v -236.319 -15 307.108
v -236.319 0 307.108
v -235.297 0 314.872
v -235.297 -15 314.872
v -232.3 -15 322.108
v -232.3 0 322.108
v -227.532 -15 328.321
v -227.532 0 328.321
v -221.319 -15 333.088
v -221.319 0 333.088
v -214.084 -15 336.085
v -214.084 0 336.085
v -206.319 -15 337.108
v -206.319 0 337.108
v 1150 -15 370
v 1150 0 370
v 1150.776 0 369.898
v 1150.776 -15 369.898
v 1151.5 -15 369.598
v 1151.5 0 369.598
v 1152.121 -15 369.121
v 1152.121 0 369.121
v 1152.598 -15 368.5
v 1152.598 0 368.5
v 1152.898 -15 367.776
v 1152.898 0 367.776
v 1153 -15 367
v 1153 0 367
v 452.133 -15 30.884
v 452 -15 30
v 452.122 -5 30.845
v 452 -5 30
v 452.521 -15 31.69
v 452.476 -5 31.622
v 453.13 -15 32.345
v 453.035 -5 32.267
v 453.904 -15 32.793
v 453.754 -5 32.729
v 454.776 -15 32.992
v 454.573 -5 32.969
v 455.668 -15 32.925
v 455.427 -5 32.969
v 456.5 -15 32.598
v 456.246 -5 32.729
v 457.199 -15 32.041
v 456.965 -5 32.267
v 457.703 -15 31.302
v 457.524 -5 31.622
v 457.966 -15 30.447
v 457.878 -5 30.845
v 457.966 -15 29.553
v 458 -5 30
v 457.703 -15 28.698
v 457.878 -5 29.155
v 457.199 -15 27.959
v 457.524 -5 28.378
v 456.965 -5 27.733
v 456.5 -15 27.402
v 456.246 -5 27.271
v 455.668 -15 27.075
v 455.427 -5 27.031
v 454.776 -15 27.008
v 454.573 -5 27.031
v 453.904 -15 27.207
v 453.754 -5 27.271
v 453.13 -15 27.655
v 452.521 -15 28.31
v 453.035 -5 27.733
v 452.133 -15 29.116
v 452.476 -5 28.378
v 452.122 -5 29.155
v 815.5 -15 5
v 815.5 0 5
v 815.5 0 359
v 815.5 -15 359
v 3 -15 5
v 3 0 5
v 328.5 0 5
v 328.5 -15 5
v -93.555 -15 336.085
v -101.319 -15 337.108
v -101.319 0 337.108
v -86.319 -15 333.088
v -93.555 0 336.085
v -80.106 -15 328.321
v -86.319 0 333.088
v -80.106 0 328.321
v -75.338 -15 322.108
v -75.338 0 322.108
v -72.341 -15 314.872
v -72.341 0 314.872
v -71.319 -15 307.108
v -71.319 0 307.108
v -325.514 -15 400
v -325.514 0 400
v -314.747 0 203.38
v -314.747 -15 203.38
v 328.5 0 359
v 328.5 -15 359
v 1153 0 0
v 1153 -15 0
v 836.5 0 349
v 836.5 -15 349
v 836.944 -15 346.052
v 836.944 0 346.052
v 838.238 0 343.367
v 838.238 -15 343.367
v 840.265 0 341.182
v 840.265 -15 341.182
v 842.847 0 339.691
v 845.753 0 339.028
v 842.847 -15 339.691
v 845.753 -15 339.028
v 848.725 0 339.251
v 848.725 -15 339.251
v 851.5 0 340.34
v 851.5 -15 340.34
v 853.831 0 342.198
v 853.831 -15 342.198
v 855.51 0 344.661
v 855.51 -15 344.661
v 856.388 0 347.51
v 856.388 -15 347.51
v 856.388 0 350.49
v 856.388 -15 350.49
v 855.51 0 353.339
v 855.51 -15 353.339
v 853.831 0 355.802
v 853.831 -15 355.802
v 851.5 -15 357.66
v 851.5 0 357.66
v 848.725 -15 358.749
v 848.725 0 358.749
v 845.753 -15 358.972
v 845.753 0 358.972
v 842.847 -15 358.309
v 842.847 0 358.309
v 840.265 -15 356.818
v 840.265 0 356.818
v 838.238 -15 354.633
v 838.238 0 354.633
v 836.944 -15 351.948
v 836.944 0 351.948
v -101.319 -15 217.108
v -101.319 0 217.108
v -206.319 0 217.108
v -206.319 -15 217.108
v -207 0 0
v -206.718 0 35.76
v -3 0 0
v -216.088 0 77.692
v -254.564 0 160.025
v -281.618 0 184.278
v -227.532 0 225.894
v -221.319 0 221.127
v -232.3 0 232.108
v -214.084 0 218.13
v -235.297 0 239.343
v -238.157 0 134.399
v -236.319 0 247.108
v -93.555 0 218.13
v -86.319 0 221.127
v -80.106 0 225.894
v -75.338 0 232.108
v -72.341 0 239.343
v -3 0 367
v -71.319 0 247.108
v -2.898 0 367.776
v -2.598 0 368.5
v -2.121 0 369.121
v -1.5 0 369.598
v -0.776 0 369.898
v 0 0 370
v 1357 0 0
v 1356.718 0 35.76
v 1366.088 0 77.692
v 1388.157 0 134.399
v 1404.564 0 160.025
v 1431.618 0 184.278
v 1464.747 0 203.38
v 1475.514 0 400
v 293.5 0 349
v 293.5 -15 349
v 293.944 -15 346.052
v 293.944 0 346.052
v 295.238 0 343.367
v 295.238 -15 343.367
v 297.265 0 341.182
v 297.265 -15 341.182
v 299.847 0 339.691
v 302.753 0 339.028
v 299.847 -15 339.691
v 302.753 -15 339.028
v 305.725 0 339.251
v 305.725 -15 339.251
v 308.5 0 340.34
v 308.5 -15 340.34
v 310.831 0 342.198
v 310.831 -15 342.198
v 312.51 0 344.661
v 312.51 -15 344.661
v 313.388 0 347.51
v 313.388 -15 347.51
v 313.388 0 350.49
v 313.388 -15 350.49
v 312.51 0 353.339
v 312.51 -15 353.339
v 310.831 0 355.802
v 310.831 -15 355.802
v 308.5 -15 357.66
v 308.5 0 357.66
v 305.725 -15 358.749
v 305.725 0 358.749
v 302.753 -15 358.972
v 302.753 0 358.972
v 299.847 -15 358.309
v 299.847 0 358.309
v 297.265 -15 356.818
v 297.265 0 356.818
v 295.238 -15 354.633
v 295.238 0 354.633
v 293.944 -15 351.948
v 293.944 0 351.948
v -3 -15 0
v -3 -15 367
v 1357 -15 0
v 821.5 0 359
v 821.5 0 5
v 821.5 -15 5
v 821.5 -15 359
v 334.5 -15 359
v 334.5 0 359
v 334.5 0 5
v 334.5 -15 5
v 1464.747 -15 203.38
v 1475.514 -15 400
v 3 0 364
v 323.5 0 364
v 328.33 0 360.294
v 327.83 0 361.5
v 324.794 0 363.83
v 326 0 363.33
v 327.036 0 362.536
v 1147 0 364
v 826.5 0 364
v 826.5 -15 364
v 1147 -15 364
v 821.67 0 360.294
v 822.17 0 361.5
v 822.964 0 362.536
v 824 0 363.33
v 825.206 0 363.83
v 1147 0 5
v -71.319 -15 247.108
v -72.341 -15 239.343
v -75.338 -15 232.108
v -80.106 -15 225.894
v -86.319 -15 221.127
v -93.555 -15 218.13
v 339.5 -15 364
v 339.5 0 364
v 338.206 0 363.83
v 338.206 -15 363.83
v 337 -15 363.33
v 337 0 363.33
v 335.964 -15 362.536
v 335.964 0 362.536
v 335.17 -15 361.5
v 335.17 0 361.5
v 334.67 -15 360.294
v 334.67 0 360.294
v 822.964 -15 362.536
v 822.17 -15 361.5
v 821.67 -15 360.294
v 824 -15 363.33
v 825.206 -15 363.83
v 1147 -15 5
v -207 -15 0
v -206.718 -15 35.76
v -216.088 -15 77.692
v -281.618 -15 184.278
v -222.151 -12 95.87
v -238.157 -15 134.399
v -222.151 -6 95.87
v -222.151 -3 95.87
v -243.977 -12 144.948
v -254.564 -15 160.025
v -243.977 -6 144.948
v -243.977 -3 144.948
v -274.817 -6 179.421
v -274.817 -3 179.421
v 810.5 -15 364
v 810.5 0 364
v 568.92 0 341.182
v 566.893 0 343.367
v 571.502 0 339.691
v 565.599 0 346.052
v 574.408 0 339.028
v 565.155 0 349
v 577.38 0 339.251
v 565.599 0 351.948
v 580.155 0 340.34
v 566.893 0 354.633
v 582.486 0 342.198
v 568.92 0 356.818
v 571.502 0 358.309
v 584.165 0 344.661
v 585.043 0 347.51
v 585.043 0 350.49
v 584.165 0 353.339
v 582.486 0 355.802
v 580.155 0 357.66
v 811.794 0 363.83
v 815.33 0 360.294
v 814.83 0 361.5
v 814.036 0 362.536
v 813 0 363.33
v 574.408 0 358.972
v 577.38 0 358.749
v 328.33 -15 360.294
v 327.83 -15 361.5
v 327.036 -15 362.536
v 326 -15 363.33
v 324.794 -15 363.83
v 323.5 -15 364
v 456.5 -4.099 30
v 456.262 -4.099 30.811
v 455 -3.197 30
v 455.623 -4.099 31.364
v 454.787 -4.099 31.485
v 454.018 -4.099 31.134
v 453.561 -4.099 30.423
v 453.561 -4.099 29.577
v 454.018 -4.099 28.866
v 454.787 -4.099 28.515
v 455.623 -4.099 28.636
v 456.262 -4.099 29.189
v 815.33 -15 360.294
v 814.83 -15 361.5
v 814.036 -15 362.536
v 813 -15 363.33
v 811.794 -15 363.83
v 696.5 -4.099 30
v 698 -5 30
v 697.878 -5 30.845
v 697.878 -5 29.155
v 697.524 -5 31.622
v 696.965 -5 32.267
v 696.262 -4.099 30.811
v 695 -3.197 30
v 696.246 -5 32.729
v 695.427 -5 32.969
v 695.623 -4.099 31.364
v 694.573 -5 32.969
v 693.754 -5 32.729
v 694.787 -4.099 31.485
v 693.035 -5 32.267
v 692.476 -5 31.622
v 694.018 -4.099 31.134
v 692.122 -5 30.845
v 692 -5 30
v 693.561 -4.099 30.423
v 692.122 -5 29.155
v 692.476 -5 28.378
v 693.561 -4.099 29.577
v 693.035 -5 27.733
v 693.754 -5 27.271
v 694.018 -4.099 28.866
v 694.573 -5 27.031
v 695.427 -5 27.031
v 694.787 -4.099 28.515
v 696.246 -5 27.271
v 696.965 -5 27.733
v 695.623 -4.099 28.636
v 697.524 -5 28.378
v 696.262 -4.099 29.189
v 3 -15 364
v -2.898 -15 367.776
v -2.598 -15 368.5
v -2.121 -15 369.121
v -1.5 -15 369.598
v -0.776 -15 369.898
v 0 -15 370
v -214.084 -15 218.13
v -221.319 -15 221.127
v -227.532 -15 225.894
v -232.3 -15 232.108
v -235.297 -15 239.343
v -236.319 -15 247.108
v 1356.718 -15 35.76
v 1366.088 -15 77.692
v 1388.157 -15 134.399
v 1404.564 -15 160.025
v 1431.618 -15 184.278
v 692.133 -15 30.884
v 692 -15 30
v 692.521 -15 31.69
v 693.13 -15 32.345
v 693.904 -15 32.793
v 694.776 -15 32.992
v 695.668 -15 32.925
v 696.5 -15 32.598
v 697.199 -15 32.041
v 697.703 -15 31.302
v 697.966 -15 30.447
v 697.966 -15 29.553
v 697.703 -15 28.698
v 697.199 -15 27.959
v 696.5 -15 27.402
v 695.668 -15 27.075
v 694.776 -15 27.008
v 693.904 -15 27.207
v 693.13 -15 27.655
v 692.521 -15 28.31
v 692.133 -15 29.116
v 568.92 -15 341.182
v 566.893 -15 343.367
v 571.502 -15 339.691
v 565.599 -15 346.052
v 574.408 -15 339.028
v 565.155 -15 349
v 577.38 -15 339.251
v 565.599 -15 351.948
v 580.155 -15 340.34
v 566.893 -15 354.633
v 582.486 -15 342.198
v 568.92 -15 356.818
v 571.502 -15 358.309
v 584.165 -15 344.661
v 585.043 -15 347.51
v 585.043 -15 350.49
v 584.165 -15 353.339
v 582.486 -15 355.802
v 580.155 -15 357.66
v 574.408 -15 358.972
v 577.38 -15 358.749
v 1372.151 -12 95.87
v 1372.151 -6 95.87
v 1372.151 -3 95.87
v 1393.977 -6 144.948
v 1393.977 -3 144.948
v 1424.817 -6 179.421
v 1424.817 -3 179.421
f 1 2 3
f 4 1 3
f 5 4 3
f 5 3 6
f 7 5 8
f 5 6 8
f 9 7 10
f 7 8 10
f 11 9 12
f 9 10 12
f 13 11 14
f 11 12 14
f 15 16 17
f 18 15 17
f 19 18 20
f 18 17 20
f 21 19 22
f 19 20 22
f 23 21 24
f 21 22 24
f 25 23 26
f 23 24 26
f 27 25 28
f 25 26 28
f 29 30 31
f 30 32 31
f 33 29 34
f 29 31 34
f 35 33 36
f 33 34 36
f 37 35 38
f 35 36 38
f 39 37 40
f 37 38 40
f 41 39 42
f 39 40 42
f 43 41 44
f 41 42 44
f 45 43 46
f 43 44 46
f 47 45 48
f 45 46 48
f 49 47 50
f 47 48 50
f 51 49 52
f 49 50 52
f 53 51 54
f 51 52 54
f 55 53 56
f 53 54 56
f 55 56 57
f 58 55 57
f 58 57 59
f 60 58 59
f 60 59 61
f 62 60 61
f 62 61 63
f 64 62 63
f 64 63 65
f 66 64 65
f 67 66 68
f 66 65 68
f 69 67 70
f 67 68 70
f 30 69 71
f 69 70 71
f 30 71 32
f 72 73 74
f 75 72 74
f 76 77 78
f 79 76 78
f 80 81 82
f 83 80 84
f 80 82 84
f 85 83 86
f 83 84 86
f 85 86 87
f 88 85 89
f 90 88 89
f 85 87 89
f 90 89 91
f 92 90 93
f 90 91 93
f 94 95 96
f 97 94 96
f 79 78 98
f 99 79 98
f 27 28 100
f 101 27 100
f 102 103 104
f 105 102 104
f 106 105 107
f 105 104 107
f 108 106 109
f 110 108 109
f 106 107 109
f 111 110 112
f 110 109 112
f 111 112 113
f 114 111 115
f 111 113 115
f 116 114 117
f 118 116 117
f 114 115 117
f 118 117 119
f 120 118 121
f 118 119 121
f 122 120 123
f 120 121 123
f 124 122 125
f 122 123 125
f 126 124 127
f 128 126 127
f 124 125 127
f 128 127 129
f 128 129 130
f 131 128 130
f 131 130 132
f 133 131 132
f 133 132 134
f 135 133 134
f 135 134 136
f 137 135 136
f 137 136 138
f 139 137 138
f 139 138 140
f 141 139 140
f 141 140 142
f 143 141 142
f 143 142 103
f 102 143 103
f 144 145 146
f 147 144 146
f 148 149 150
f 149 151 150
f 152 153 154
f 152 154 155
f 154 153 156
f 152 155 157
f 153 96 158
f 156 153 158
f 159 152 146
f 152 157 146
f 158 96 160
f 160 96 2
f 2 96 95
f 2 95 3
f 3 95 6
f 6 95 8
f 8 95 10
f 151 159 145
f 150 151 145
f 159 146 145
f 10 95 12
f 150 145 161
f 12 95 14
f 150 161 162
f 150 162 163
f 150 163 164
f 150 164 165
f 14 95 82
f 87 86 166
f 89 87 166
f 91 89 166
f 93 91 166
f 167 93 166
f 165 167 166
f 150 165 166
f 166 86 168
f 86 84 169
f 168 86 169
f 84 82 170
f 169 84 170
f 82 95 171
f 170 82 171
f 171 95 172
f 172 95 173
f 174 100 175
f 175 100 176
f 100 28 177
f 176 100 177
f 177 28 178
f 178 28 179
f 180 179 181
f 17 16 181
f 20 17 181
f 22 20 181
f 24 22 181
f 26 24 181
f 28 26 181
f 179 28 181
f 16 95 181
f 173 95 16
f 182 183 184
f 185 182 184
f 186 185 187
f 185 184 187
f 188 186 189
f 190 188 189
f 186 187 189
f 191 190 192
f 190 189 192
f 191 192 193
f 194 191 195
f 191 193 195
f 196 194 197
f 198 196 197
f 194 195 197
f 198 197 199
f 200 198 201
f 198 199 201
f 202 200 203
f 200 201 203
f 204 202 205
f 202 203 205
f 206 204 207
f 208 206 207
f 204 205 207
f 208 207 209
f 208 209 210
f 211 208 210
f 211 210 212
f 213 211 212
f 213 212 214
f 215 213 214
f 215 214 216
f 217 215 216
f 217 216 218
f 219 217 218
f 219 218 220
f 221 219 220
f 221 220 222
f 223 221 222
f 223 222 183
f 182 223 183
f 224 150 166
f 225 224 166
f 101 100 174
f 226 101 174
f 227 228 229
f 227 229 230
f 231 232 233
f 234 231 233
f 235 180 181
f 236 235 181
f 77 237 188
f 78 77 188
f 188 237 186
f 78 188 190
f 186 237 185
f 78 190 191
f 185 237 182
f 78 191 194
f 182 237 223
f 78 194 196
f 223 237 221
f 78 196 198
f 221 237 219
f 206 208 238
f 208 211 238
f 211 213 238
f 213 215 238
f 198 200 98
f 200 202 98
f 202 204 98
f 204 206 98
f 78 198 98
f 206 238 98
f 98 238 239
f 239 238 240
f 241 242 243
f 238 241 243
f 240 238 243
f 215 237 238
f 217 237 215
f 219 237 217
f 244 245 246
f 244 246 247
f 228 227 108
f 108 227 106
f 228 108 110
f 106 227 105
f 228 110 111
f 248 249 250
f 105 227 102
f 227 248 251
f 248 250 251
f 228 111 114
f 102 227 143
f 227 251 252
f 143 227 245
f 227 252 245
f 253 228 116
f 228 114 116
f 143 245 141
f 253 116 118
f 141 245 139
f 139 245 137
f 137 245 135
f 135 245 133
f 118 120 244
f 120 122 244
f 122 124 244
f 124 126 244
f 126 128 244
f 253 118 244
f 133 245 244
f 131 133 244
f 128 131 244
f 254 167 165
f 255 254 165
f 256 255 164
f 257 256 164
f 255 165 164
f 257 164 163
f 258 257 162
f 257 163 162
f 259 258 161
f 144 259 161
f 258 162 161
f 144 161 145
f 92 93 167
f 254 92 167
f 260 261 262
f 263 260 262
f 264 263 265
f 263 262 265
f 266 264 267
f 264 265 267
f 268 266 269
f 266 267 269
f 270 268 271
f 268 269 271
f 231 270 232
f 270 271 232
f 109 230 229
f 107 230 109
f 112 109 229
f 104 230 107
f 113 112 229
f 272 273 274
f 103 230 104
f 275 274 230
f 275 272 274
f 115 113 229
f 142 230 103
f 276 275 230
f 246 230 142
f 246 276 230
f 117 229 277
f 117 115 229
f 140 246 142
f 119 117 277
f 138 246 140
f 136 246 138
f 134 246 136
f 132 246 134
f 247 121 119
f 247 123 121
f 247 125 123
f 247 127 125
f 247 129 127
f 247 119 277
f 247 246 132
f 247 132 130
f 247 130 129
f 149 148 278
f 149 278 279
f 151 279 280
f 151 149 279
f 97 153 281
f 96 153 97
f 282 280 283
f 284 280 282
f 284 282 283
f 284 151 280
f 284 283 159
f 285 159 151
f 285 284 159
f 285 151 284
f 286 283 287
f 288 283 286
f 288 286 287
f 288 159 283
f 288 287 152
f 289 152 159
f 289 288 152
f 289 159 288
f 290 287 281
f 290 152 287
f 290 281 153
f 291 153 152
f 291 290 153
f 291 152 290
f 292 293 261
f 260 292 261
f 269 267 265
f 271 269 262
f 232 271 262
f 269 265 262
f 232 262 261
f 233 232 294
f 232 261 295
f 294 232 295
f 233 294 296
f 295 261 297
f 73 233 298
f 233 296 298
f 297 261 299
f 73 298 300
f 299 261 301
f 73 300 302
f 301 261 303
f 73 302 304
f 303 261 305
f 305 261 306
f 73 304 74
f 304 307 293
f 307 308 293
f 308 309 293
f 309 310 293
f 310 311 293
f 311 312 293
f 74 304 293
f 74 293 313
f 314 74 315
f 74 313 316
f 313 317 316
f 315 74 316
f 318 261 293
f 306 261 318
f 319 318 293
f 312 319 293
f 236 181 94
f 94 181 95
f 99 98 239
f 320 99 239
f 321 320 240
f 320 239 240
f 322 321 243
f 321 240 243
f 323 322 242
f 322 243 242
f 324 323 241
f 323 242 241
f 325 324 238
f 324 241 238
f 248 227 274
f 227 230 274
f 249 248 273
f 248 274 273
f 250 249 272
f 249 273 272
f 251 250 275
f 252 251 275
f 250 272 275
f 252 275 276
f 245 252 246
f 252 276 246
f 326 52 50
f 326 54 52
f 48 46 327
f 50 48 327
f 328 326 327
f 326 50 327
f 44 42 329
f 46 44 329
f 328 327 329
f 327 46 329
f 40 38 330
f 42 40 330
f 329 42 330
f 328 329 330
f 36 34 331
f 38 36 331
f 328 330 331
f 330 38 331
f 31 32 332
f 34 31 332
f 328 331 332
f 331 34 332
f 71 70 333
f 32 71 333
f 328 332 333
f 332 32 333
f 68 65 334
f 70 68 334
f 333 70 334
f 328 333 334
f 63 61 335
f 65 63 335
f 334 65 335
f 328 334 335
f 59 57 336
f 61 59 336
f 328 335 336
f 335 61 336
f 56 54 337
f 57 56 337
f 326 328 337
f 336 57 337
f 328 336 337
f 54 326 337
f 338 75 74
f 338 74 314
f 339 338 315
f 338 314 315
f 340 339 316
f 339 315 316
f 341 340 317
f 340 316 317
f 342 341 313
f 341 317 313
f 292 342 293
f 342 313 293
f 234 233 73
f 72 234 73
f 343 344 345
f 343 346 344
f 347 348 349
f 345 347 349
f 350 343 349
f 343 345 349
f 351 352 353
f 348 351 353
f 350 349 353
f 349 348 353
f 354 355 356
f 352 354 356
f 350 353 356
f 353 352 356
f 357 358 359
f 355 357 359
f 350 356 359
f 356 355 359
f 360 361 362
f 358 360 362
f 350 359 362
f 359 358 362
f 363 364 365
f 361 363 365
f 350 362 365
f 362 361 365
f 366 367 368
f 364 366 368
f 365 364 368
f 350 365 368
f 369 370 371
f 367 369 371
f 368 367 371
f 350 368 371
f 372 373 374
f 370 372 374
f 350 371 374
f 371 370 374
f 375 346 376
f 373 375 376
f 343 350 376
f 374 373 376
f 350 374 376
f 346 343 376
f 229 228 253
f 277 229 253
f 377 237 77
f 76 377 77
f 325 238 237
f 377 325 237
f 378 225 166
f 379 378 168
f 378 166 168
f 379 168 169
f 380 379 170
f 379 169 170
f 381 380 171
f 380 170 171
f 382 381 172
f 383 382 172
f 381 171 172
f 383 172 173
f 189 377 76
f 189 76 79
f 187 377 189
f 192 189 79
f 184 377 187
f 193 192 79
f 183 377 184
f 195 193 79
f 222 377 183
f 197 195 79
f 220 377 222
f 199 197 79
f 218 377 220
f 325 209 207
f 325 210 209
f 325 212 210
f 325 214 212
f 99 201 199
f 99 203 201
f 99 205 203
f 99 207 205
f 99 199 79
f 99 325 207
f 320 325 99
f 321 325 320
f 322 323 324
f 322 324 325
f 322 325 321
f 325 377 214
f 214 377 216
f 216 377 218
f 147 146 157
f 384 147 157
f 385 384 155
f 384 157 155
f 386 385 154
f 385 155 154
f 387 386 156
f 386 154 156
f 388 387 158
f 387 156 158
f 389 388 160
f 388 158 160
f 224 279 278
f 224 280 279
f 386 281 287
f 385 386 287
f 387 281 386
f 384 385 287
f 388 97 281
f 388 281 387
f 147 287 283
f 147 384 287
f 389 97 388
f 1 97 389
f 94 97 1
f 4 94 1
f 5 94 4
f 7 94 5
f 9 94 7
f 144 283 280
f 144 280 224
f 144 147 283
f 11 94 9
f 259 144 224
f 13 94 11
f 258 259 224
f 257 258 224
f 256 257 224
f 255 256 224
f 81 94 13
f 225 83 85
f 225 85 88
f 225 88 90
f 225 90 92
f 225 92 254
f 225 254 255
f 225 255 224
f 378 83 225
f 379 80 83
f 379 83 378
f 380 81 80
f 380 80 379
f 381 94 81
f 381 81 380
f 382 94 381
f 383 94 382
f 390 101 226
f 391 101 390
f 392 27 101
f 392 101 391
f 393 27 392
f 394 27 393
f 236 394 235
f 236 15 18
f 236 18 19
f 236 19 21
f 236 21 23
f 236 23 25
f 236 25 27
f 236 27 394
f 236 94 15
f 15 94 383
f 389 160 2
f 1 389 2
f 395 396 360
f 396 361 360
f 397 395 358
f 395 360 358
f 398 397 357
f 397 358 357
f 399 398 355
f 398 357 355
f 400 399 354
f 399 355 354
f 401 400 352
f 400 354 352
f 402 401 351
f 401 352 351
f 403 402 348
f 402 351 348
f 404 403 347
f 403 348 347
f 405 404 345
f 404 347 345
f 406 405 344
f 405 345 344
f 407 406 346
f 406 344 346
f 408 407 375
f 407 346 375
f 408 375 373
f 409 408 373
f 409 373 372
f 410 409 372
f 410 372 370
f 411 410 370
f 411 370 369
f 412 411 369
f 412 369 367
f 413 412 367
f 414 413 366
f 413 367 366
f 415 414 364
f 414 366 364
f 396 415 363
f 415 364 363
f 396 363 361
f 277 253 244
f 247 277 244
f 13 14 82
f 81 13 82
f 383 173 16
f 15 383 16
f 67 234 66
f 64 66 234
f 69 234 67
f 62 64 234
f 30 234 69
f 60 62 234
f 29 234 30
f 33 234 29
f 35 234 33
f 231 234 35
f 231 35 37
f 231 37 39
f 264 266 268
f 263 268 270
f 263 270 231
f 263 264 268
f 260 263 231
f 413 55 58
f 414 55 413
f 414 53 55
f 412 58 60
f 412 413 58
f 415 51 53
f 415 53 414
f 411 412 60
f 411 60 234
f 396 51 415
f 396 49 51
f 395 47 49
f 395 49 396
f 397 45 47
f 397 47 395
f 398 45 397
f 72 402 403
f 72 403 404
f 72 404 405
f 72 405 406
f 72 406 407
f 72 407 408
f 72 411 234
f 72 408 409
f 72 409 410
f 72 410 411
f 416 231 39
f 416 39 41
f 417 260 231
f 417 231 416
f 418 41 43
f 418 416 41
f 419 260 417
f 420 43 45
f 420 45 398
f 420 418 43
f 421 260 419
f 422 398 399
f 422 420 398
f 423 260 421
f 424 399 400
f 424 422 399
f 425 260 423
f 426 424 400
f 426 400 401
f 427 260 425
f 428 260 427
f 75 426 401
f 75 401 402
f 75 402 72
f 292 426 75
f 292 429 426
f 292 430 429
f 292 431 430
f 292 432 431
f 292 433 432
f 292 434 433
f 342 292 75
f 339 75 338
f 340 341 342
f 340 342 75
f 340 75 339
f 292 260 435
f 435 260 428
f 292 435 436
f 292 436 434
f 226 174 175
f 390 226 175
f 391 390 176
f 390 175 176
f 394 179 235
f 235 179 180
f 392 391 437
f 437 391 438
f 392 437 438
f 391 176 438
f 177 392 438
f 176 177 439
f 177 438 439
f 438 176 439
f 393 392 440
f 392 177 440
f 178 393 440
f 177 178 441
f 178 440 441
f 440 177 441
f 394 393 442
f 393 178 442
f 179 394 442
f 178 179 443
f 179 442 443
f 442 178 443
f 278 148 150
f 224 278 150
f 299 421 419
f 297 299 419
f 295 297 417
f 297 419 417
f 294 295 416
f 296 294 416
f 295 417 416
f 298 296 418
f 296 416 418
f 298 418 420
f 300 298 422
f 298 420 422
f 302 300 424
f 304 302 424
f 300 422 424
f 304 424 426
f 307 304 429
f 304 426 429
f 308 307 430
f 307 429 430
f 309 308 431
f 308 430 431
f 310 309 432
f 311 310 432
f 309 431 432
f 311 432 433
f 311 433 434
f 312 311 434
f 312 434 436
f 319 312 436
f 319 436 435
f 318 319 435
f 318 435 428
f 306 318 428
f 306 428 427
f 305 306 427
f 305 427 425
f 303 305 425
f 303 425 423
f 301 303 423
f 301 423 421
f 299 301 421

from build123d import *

# Parameters (mm, degrees)
F1_DEPTH = 15
F0_W     = 325.5
F0_H     = 359
F3_D     = 20
F3_2_D   = 20
F4_D     = 20
F6_D     = 6
F6_DEPTH = 10
F6_TIP   = 1.8025818571
F7_R     = 5


# Not quite as in the source:
# - a feature names something its author has since deleted; it is built from what else it names


with BuildPart() as f1:
    # F0 (on Front) → F1 (new body)
    with BuildSketch(Plane.XZ):
        with BuildLine():
            Line((323.5, 364), (3, 364))
            Line((3, 364), (3, 5))
            Line((3, 5), (328.5, 5))
            Line((328.5, 5), (328.5, 359))
            ThreePointArc((328.5, 359), (327.0355339059, 362.5355339059), (323.5, 364))
        make_face()
    extrude(amount=F1_DEPTH)

    # F3 (through all)
    with Locations(Plane(origin=(0, 0, 0), x_dir=(1, 0, 0), z_dir=(0, 1, 0))):
        with Locations((846.5, -349), (303.5, -349)):
            Hole(F3_D / 2)


with BuildPart() as f1b:
    # F0 (on Front) → F1, piece 2 (new body)
    with BuildSketch(Plane.XZ):
        with BuildLine():
            Line((1153, 367), (1153, 0))
            Line((1153, 0), (1357, 0))
            add(Edge.make_bspline(
                [(1357, 0), (1356.1672278551, 12.2122007475), (1354.31211947, 39.4164680214), (1370.6949740653, 94.7784632641), (1392.6268048722, 148.6262577603), (1423.2353721262, 181.2785277748), (1450.7449633607, 195.9247766546), (1464.7470712662, 203.3795714378)],
                knots=[0, 0, 0, 0, 0.1777103276, 0.3958728938, 0.6151864439, 0.8041337332, 1, 1, 1, 1], degree=3))
            Line((1464.7470712662, 203.3795714378), (1475.5141735077, 400))
            Line((1475.5141735077, 400), (575, 400))
            Line((575, 400), (-325.5141735077, 400))
            Line((-325.5141735077, 400), (-314.7470712662, 203.3795714378))
            add(Edge.make_bspline(
                [(-207, 0), (-206.1672278551, 12.2122007475), (-204.31211947, 39.4164680214), (-220.6949740653, 94.7784632641), (-242.6268048722, 148.6262577603), (-273.2353721262, 181.2785277748), (-300.7449633607, 195.9247766546), (-314.7470712662, 203.3795714378)],
                knots=[0, 0, 0, 0, 0.1777103276, 0.3958728938, 0.6151864439, 0.8041337332, 1, 1, 1, 1], degree=3))
            Line((-207, 0), (-3, 0))
            Line((-3, 0), (-3, 367))
            ThreePointArc((-3, 367), (-2.1213203436, 369.1213203436), (0, 370))
            Line((0, 370), (1150, 370))
            ThreePointArc((1150, 370), (1152.1213203436, 369.1213203436), (1153, 367))
        make_face()
        with BuildLine():
            Line((-206.3191956282, 337.107616663), (-101.3191956282, 337.107616663))
            ThreePointArc((-101.3191956282, 337.107616663), (-80.1059921926, 328.3208200986), (-71.3191956282, 307.107616663))
            Line((-71.3191956282, 307.107616663), (-71.3191956282, 247.107616663))
            ThreePointArc((-71.3191956282, 247.107616663), (-80.1059921926, 225.8944132274), (-101.3191956282, 217.107616663))
            Line((-101.3191956282, 217.107616663), (-206.3191956282, 217.107616663))
            ThreePointArc((-206.3191956282, 217.107616663), (-227.5323990638, 225.8944132274), (-236.3191956282, 247.107616663))
            Line((-236.3191956282, 247.107616663), (-236.3191956282, 307.107616663))
            ThreePointArc((-236.3191956282, 307.107616663), (-227.5323990638, 328.3208200986), (-206.3191956282, 337.107616663))
        make_face(mode=Mode.SUBTRACT)
    extrude(amount=F1_DEPTH)


with BuildPart() as f1c:
    # F0 (on Front) → F1, piece 3 (new body)
    with BuildSketch(Plane.XZ):
        with Locations((984.25, 184.5)):
            Rectangle(F0_W, F0_H)
    extrude(amount=F1_DEPTH)

    # F3#2 (through all)
    with Locations(Plane(origin=(0, 0, 0), x_dir=(1, 0, 0), z_dir=(0, 1, 0))):
        with Locations((846.5, -349), (303.5, -349)):
            Hole(F3_2_D / 2)

    # F7
    f7_edges = [f1c.edges().sort_by_distance(p)[0] for p in [
        (821.5, -7.5, 364),
    ]]
    fillet(f7_edges, radius=F7_R)


with BuildPart() as f1d:
    # F0 (on Front) → F1, piece 4 (new body)
    with BuildSketch(Plane.XZ):
        with BuildLine():
            Line((334.5, 359), (334.5, 5))
            Line((334.5, 5), (815.5, 5))
            Line((815.5, 5), (815.5, 359))
            ThreePointArc((815.5, 359), (814.0355339059, 362.5355339059), (810.5, 364))
            Line((810.5, 364), (339.5, 364))
            ThreePointArc((339.5, 364), (335.9644660941, 362.5355339059), (334.5, 359))
        make_face()
    extrude(amount=F1_DEPTH)

    # F4 (through all)
    with Locations(Plane(origin=(0, 0, 0), x_dir=(1, 0, 0), z_dir=(0, 1, 0))):
        with Locations((575.1550197601, -349)):
            Hole(F4_D / 2)

    # F6
    with Locations(Plane.XZ.offset(15)):
        with Locations((455, 30), (695, 30)):
            Hole(F6_D / 2, depth=F6_DEPTH)
            with Locations((0, 0, -(F6_DEPTH + F6_TIP / 2))):  # 118° drill point
                Cone(0, F6_D / 2, F6_TIP, mode=Mode.SUBTRACT)


solid = Compound([f1.part, f1b.part, f1c.part, f1d.part])
